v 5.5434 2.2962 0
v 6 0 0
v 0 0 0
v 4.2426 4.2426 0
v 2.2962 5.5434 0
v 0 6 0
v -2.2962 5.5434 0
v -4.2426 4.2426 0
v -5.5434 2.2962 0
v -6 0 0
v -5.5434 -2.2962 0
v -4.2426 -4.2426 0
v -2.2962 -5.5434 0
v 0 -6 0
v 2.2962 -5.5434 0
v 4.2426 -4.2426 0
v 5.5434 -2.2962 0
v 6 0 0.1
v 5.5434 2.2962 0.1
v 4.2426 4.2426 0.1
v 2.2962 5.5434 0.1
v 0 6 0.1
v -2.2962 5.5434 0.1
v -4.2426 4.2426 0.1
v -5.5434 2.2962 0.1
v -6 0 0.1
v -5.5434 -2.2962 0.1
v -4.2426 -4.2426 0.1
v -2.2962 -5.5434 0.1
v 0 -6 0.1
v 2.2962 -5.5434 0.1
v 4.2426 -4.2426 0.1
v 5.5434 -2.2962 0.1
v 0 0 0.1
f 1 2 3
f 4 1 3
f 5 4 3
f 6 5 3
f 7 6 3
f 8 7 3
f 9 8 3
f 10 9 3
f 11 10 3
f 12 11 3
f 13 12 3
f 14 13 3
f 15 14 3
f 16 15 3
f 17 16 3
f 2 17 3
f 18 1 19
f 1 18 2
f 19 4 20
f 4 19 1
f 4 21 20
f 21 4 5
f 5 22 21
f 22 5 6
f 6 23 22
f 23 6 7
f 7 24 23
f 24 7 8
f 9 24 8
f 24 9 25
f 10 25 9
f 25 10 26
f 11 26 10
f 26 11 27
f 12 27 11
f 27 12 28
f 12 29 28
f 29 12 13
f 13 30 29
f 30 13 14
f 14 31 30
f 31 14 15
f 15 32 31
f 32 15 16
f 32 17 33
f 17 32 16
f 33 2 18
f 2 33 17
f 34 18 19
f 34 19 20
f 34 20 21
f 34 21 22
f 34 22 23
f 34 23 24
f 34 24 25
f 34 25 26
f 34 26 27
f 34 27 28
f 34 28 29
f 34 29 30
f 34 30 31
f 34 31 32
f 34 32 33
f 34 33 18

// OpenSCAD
// file: ../p/4-4cyli.scad
use <../lib.scad>
function ldraw_lib__4_4cyli() = [
// 0 Cylinder 1.0
// 0 Name: 4-4cyli.dat
// 0 Author: James Jessiman
// 0 !LDRAW_ORG Primitive UPDATE 2005-01
// 0 !LICENSE Licensed under CC BY 4.0 : see CAreadme.txt
// 
// 0 BFC CERTIFY CCW
  [0,"BFC","CERTIFY"],
  [0,"BFC","CCW"],
// 
// 0 !HISTORY 1998-12-15 [PTadmin] Official Update 1998-10
// 0 !HISTORY 2002-03-23 [sbliss] Added BFC statement; merged headers from files in distributions LDraw 0.27 and Complete.
// 0 !HISTORY 2002-04-25 [PTadmin] Official Update 2002-02
// 0 !HISTORY 2004-12-14 [guyvivan] BFC CCW
// 0 !HISTORY 2005-12-28 [PTadmin] Official Update 2005-01
// 0 !HISTORY 2007-06-24 [PTadmin] Header formatted for Contributor Agreement
// 0 !HISTORY 2008-07-01 [PTadmin] Official Update 2008-01
// 
// 
// 4 16 1 1 0 0.9239 1 0.3827 0.9239 0 0.3827 1 0 0
  [4,16,1,1,0,0.9239,1,0.3827,0.9239,0,0.3827,1,0,0],
// 5 24 1 0 0 1 1 0 0.9239 0 0.3827 0.9239 0 -0.3827
  [5,24,1,0,0,1,1,0,0.9239,0,0.3827,0.9239,0,-0.3827],
// 4 16 0.9239 1 0.3827 0.7071 1 0.7071 0.7071 0 0.7071 0.9239 0 0.3827
  [4,16,0.9239,1,0.3827,0.7071,1,0.7071,0.7071,0,0.7071,0.9239,0,0.3827],
// 5 24 0.9239 0 0.3827 0.9239 1 0.3827 0.7071 0 0.7071 1 0 0
  [5,24,0.9239,0,0.3827,0.9239,1,0.3827,0.7071,0,0.7071,1,0,0],
// 4 16 0.7071 1 0.7071 0.3827 1 0.9239 0.3827 0 0.9239 0.7071 0 0.7071
  [4,16,0.7071,1,0.7071,0.3827,1,0.9239,0.3827,0,0.9239,0.7071,0,0.7071],
// 5 24 0.7071 0 0.7071 0.7071 1 0.7071 0.3827 0 0.9239 0.9239 0 0.3827
  [5,24,0.7071,0,0.7071,0.7071,1,0.7071,0.3827,0,0.9239,0.9239,0,0.3827],
// 4 16 0.3827 1 0.9239 0 1 1 0 0 1 0.3827 0 0.9239
  [4,16,0.3827,1,0.9239,0,1,1,0,0,1,0.3827,0,0.9239],
// 5 24 0.3827 0 0.9239 0.3827 1 0.9239 0 0 1 0.7071 0 0.7071
  [5,24,0.3827,0,0.9239,0.3827,1,0.9239,0,0,1,0.7071,0,0.7071],
// 4 16 0 1 1 -0.3827 1 0.9239 -0.3827 0 0.9239 0 0 1
  [4,16,0,1,1,-0.3827,1,0.9239,-0.3827,0,0.9239,0,0,1],
// 5 24 0 0 1 0 1 1 -0.3827 0 0.9239 0.3827 0 0.9239
  [5,24,0,0,1,0,1,1,-0.3827,0,0.9239,0.3827,0,0.9239],
// 4 16 -0.3827 1 0.9239 -0.7071 1 0.7071 -0.7071 0 0.7071 -0.3827 0 0.9239
  [4,16,-0.3827,1,0.9239,-0.7071,1,0.7071,-0.7071,0,0.7071,-0.3827,0,0.9239],
// 5 24 -0.3827 0 0.9239 -0.3827 1 0.9239 -0.7071 0 0.7071 0 0 1
  [5,24,-0.3827,0,0.9239,-0.3827,1,0.9239,-0.7071,0,0.7071,0,0,1],
// 4 16 -0.7071 1 0.7071 -0.9239 1 0.3827 -0.9239 0 0.3827 -0.7071 0 0.7071
  [4,16,-0.7071,1,0.7071,-0.9239,1,0.3827,-0.9239,0,0.3827,-0.7071,0,0.7071],
// 5 24 -0.7071 0 0.7071 -0.7071 1 0.7071 -0.9239 0 0.3827 -0.3827 0 0.9239
  [5,24,-0.7071,0,0.7071,-0.7071,1,0.7071,-0.9239,0,0.3827,-0.3827,0,0.9239],
// 4 16 -0.9239 1 0.3827 -1 1 0 -1 0 0 -0.9239 0 0.3827
  [4,16,-0.9239,1,0.3827,-1,1,0,-1,0,0,-0.9239,0,0.3827],
// 5 24 -0.9239 0 0.3827 -0.9239 1 0.3827 -1 0 0 -0.7071 0 0.7071
  [5,24,-0.9239,0,0.3827,-0.9239,1,0.3827,-1,0,0,-0.7071,0,0.7071],
// 4 16 -1 1 0 -0.9239 1 -0.3827 -0.9239 0 -0.3827 -1 0 0
  [4,16,-1,1,0,-0.9239,1,-0.3827,-0.9239,0,-0.3827,-1,0,0],
// 5 24 -1 0 0 -1 1 0 -0.9239 0 -0.3827 -0.9239 0 0.3827
  [5,24,-1,0,0,-1,1,0,-0.9239,0,-0.3827,-0.9239,0,0.3827],
// 4 16 -0.9239 1 -0.3827 -0.7071 1 -0.7071 -0.7071 0 -0.7071 -0.9239 0 -0.3827
  [4,16,-0.9239,1,-0.3827,-0.7071,1,-0.7071,-0.7071,0,-0.7071,-0.9239,0,-0.3827],
// 5 24 -0.9239 0 -0.3827 -0.9239 1 -0.3827 -0.7071 0 -0.7071 -1 0 0
  [5,24,-0.9239,0,-0.3827,-0.9239,1,-0.3827,-0.7071,0,-0.7071,-1,0,0],
// 4 16 -0.7071 1 -0.7071 -0.3827 1 -0.9239 -0.3827 0 -0.9239 -0.7071 0 -0.7071
  [4,16,-0.7071,1,-0.7071,-0.3827,1,-0.9239,-0.3827,0,-0.9239,-0.7071,0,-0.7071],
// 5 24 -0.7071 0 -0.7071 -0.7071 1 -0.7071 -0.3827 0 -0.9239 -0.9239 0 -0.3827
  [5,24,-0.7071,0,-0.7071,-0.7071,1,-0.7071,-0.3827,0,-0.9239,-0.9239,0,-0.3827],
// 4 16 -0.3827 1 -0.9239 0 1 -1 0 0 -1 -0.3827 0 -0.9239
  [4,16,-0.3827,1,-0.9239,0,1,-1,0,0,-1,-0.3827,0,-0.9239],
// 5 24 -0.3827 0 -0.9239 -0.3827 1 -0.9239 0 0 -1 -0.7071 0 -0.7071
  [5,24,-0.3827,0,-0.9239,-0.3827,1,-0.9239,0,0,-1,-0.7071,0,-0.7071],
// 4 16 0 1 -1 0.3827 1 -0.9239 0.3827 0 -0.9239 0 0 -1
  [4,16,0,1,-1,0.3827,1,-0.9239,0.3827,0,-0.9239,0,0,-1],
// 5 24 0 0 -1 0 1 -1 0.3827 0 -0.9239 -0.3827 0 -0.9239
  [5,24,0,0,-1,0,1,-1,0.3827,0,-0.9239,-0.3827,0,-0.9239],
// 4 16 0.3827 1 -0.9239 0.7071 1 -0.7071 0.7071 0 -0.7071 0.3827 0 -0.9239
  [4,16,0.3827,1,-0.9239,0.7071,1,-0.7071,0.7071,0,-0.7071,0.3827,0,-0.9239],
// 5 24 0.3827 0 -0.9239 0.3827 1 -0.9239 0.7071 0 -0.7071 0 0 -1
  [5,24,0.3827,0,-0.9239,0.3827,1,-0.9239,0.7071,0,-0.7071,0,0,-1],
// 4 16 0.7071 1 -0.7071 0.9239 1 -0.3827 0.9239 0 -0.3827 0.7071 0 -0.7071
  [4,16,0.7071,1,-0.7071,0.9239,1,-0.3827,0.9239,0,-0.3827,0.7071,0,-0.7071],
// 5 24 0.7071 0 -0.7071 0.7071 1 -0.7071 0.9239 0 -0.3827 0.3827 0 -0.9239
  [5,24,0.7071,0,-0.7071,0.7071,1,-0.7071,0.9239,0,-0.3827,0.3827,0,-0.9239],
// 4 16 0.9239 1 -0.3827 1 1 0 1 0 0 0.9239 0 -0.3827
  [4,16,0.9239,1,-0.3827,1,1,0,1,0,0,0.9239,0,-0.3827],
// 5 24 0.9239 0 -0.3827 0.9239 1 -0.3827 1 0 0 0.7071 0 -0.7071
  [5,24,0.9239,0,-0.3827,0.9239,1,-0.3827,1,0,0,0.7071,0,-0.7071],
// 0
];
module ldraw_lib__4_4cyli(step=0, col=false, unit=2/5, alt=false, line=0.2, solid=!$preview)
    makepoly(ldraw_lib__4_4cyli(), step=step, col=col, unit=unit, alt=alt, line=line, solid=solid);
ldraw_lib__4_4cyli(line=0.2);
// file: ../p/4-4disc.scad
use <../lib.scad>
function ldraw_lib__4_4disc() = [
// 0 Disc 1.0
// 0 Name: 4-4disc.dat
// 0 Author: James Jessiman
// 0 !LDRAW_ORG Primitive UPDATE 2002-02
// 0 !LICENSE Licensed under CC BY 4.0 : see CAreadme.txt
// 
// 0 BFC CERTIFY CCW
  [0,"BFC","CERTIFY"],
  [0,"BFC","CCW"],
// 
// 0 !HISTORY 1998-12-15 [PTadmin] Official Update 1998-10
// 0 !HISTORY 2002-03-23 [sbliss] Added BFC statement
// 0 !HISTORY 2002-04-25 [PTadmin] Official Update 2002-02
// 0 !HISTORY 2007-06-24 [PTadmin] Header formatted for Contributor Agreement
// 0 !HISTORY 2008-07-01 [PTadmin] Official Update 2008-01
// 
// 
// 3 16 0 0 0 1 0 0 0.9239 0 0.3827
  [3,16,0,0,0,1,0,0,0.9239,0,0.3827],
// 3 16 0 0 0 0.9239 0 0.3827 0.7071 0 0.7071
  [3,16,0,0,0,0.9239,0,0.3827,0.7071,0,0.7071],
// 3 16 0 0 0 0.7071 0 0.7071 0.3827 0 0.9239
  [3,16,0,0,0,0.7071,0,0.7071,0.3827,0,0.9239],
// 3 16 0 0 0 0.3827 0 0.9239 0 0 1
  [3,16,0,0,0,0.3827,0,0.9239,0,0,1],
// 3 16 0 0 0 0 0 1 -0.3827 0 0.9239
  [3,16,0,0,0,0,0,1,-0.3827,0,0.9239],
// 3 16 0 0 0 -0.3827 0 0.9239 -0.7071 0 0.7071
  [3,16,0,0,0,-0.3827,0,0.9239,-0.7071,0,0.7071],
// 3 16 0 0 0 -0.7071 0 0.7071 -0.9239 0 0.3827
  [3,16,0,0,0,-0.7071,0,0.7071,-0.9239,0,0.3827],
// 3 16 0 0 0 -0.9239 0 0.3827 -1 0 -0
  [3,16,0,0,0,-0.9239,0,0.3827,-1,0,-0],
// 3 16 0 0 0 -1 0 -0 -0.9239 0 -0.3827
  [3,16,0,0,0,-1,0,-0,-0.9239,0,-0.3827],
// 3 16 0 0 0 -0.9239 0 -0.3827 -0.7071 0 -0.7071
  [3,16,0,0,0,-0.9239,0,-0.3827,-0.7071,0,-0.7071],
// 3 16 0 0 0 -0.7071 0 -0.7071 -0.3827 0 -0.9239
  [3,16,0,0,0,-0.7071,0,-0.7071,-0.3827,0,-0.9239],
// 3 16 0 0 0 -0.3827 0 -0.9239 0 0 -1
  [3,16,0,0,0,-0.3827,0,-0.9239,0,0,-1],
// 3 16 0 0 0 0 0 -1 0.3827 0 -0.9239
  [3,16,0,0,0,0,0,-1,0.3827,0,-0.9239],
// 3 16 0 0 0 0.3827 0 -0.9239 0.7071 0 -0.7071
  [3,16,0,0,0,0.3827,0,-0.9239,0.7071,0,-0.7071],
// 3 16 0 0 0 0.7071 0 -0.7071 0.9239 0 -0.3827
  [3,16,0,0,0,0.7071,0,-0.7071,0.9239,0,-0.3827],
// 3 16 0 0 0 0.9239 0 -0.3827 1 0 0
  [3,16,0,0,0,0.9239,0,-0.3827,1,0,0],
// 0
];
module ldraw_lib__4_4disc(step=0, col=false, unit=2/5, alt=false, line=0.2, solid=!$preview)
    makepoly(ldraw_lib__4_4disc(), step=step, col=col, unit=unit, alt=alt, line=line, solid=solid);
ldraw_lib__4_4disc(line=0.2);
// file: ../p/4-4cylc3.scad
use <../lib.scad>
use <4-4cyli.scad>
use <4-4disc.scad>
function ldraw_lib__4_4cylc3() = [
// 0 Cylinder Closed 1.0 without Top or Bottom Edge Lines
// 0 Name: 4-4cylc3.dat
// 0 Author: Chris Dee [cwdee]
// 0 !LDRAW_ORG Primitive UPDATE 2017-01
// 0 !LICENSE Licensed under CC BY 4.0 : see CAreadme.txt
// 
// 0 BFC CERTIFY CCW
  [0,"BFC","CERTIFY"],
  [0,"BFC","CCW"],
// 
// 0 !HISTORY 2017-12-30 [PTadmin] Official Update 2017-01
// 
// 
// 1 16 0 0 0 1 0 0 0 1 0 0 0 1 4-4disc.dat
  [1,16,0,0,0,1,0,0,0,1,0,0,0,1, ldraw_lib__4_4disc()],
// 1 16 0 0 0 1 0 0 0 1 0 0 0 1 4-4cyli.dat
  [1,16,0,0,0,1,0,0,0,1,0,0,0,1, ldraw_lib__4_4cyli()],
// 0
];
module ldraw_lib__4_4cylc3(step=0, col=false, unit=2/5, alt=false, line=0.2, solid=!$preview)
    makepoly(ldraw_lib__4_4cylc3(), step=step, col=col, unit=unit, alt=alt, line=line, solid=solid);
ldraw_lib__4_4cylc3(line=0.2);
// main file
use <../lib.scad>
use <../p/4-4cylc3.scad>
use <../p/4-4disc.scad>
function ldraw_lib__4521675a() = [
// 0 Sticker  1.5 x  1.5 Round with Chrome Pink Surface
// 0 Name: 4521675a.dat
// 0 Author: Gabriel Läufer [Dr.Bricktacular]
// 0 !LDRAW_ORG Part UPDATE 2025-02
// 0 !LICENSE Licensed under CC BY 4.0 : see CAreadme.txt
// 
// 0 BFC CERTIFY CCW
  [0,"BFC","CERTIFY"],
  [0,"BFC","CCW"],
// 
// 0 !KEYWORDS Belville, Bricklink 7586stk02, Brickowl 745024, Rebrickable 62318
// 0 !KEYWORDS Set 7586, Sunshine Home
// 
// 0 !HISTORY 2025-02-27 [OrionP] Official Update 2025-02
// 
// 0 // Sticker-Bottom
// 1 16 0 0 0 15 0 0 0 -0.25 0 0 0 15 4-4cylc3.dat
  [1,16,0,0,0,15,0,0,0,-0.25,0,0,0,15, ldraw_lib__4_4cylc3()],
// 
// 0 // Sticker-Front
// 1 63 0 -.25 0 15 0 0 0 1 0 0 0 15 4-4disc.dat
  [1,63,0,-.25,0,15,0,0,0,1,0,0,0,15, ldraw_lib__4_4disc()],
];
module ldraw_lib__4521675a(step=0, col=false, unit=2/5, alt=false, line=0.2, solid=!$preview)
    makepoly(ldraw_lib__4521675a(), step=step, col=col, unit=unit, alt=alt, line=line, solid=solid);
ldraw_lib__4521675a(line=0.2);
